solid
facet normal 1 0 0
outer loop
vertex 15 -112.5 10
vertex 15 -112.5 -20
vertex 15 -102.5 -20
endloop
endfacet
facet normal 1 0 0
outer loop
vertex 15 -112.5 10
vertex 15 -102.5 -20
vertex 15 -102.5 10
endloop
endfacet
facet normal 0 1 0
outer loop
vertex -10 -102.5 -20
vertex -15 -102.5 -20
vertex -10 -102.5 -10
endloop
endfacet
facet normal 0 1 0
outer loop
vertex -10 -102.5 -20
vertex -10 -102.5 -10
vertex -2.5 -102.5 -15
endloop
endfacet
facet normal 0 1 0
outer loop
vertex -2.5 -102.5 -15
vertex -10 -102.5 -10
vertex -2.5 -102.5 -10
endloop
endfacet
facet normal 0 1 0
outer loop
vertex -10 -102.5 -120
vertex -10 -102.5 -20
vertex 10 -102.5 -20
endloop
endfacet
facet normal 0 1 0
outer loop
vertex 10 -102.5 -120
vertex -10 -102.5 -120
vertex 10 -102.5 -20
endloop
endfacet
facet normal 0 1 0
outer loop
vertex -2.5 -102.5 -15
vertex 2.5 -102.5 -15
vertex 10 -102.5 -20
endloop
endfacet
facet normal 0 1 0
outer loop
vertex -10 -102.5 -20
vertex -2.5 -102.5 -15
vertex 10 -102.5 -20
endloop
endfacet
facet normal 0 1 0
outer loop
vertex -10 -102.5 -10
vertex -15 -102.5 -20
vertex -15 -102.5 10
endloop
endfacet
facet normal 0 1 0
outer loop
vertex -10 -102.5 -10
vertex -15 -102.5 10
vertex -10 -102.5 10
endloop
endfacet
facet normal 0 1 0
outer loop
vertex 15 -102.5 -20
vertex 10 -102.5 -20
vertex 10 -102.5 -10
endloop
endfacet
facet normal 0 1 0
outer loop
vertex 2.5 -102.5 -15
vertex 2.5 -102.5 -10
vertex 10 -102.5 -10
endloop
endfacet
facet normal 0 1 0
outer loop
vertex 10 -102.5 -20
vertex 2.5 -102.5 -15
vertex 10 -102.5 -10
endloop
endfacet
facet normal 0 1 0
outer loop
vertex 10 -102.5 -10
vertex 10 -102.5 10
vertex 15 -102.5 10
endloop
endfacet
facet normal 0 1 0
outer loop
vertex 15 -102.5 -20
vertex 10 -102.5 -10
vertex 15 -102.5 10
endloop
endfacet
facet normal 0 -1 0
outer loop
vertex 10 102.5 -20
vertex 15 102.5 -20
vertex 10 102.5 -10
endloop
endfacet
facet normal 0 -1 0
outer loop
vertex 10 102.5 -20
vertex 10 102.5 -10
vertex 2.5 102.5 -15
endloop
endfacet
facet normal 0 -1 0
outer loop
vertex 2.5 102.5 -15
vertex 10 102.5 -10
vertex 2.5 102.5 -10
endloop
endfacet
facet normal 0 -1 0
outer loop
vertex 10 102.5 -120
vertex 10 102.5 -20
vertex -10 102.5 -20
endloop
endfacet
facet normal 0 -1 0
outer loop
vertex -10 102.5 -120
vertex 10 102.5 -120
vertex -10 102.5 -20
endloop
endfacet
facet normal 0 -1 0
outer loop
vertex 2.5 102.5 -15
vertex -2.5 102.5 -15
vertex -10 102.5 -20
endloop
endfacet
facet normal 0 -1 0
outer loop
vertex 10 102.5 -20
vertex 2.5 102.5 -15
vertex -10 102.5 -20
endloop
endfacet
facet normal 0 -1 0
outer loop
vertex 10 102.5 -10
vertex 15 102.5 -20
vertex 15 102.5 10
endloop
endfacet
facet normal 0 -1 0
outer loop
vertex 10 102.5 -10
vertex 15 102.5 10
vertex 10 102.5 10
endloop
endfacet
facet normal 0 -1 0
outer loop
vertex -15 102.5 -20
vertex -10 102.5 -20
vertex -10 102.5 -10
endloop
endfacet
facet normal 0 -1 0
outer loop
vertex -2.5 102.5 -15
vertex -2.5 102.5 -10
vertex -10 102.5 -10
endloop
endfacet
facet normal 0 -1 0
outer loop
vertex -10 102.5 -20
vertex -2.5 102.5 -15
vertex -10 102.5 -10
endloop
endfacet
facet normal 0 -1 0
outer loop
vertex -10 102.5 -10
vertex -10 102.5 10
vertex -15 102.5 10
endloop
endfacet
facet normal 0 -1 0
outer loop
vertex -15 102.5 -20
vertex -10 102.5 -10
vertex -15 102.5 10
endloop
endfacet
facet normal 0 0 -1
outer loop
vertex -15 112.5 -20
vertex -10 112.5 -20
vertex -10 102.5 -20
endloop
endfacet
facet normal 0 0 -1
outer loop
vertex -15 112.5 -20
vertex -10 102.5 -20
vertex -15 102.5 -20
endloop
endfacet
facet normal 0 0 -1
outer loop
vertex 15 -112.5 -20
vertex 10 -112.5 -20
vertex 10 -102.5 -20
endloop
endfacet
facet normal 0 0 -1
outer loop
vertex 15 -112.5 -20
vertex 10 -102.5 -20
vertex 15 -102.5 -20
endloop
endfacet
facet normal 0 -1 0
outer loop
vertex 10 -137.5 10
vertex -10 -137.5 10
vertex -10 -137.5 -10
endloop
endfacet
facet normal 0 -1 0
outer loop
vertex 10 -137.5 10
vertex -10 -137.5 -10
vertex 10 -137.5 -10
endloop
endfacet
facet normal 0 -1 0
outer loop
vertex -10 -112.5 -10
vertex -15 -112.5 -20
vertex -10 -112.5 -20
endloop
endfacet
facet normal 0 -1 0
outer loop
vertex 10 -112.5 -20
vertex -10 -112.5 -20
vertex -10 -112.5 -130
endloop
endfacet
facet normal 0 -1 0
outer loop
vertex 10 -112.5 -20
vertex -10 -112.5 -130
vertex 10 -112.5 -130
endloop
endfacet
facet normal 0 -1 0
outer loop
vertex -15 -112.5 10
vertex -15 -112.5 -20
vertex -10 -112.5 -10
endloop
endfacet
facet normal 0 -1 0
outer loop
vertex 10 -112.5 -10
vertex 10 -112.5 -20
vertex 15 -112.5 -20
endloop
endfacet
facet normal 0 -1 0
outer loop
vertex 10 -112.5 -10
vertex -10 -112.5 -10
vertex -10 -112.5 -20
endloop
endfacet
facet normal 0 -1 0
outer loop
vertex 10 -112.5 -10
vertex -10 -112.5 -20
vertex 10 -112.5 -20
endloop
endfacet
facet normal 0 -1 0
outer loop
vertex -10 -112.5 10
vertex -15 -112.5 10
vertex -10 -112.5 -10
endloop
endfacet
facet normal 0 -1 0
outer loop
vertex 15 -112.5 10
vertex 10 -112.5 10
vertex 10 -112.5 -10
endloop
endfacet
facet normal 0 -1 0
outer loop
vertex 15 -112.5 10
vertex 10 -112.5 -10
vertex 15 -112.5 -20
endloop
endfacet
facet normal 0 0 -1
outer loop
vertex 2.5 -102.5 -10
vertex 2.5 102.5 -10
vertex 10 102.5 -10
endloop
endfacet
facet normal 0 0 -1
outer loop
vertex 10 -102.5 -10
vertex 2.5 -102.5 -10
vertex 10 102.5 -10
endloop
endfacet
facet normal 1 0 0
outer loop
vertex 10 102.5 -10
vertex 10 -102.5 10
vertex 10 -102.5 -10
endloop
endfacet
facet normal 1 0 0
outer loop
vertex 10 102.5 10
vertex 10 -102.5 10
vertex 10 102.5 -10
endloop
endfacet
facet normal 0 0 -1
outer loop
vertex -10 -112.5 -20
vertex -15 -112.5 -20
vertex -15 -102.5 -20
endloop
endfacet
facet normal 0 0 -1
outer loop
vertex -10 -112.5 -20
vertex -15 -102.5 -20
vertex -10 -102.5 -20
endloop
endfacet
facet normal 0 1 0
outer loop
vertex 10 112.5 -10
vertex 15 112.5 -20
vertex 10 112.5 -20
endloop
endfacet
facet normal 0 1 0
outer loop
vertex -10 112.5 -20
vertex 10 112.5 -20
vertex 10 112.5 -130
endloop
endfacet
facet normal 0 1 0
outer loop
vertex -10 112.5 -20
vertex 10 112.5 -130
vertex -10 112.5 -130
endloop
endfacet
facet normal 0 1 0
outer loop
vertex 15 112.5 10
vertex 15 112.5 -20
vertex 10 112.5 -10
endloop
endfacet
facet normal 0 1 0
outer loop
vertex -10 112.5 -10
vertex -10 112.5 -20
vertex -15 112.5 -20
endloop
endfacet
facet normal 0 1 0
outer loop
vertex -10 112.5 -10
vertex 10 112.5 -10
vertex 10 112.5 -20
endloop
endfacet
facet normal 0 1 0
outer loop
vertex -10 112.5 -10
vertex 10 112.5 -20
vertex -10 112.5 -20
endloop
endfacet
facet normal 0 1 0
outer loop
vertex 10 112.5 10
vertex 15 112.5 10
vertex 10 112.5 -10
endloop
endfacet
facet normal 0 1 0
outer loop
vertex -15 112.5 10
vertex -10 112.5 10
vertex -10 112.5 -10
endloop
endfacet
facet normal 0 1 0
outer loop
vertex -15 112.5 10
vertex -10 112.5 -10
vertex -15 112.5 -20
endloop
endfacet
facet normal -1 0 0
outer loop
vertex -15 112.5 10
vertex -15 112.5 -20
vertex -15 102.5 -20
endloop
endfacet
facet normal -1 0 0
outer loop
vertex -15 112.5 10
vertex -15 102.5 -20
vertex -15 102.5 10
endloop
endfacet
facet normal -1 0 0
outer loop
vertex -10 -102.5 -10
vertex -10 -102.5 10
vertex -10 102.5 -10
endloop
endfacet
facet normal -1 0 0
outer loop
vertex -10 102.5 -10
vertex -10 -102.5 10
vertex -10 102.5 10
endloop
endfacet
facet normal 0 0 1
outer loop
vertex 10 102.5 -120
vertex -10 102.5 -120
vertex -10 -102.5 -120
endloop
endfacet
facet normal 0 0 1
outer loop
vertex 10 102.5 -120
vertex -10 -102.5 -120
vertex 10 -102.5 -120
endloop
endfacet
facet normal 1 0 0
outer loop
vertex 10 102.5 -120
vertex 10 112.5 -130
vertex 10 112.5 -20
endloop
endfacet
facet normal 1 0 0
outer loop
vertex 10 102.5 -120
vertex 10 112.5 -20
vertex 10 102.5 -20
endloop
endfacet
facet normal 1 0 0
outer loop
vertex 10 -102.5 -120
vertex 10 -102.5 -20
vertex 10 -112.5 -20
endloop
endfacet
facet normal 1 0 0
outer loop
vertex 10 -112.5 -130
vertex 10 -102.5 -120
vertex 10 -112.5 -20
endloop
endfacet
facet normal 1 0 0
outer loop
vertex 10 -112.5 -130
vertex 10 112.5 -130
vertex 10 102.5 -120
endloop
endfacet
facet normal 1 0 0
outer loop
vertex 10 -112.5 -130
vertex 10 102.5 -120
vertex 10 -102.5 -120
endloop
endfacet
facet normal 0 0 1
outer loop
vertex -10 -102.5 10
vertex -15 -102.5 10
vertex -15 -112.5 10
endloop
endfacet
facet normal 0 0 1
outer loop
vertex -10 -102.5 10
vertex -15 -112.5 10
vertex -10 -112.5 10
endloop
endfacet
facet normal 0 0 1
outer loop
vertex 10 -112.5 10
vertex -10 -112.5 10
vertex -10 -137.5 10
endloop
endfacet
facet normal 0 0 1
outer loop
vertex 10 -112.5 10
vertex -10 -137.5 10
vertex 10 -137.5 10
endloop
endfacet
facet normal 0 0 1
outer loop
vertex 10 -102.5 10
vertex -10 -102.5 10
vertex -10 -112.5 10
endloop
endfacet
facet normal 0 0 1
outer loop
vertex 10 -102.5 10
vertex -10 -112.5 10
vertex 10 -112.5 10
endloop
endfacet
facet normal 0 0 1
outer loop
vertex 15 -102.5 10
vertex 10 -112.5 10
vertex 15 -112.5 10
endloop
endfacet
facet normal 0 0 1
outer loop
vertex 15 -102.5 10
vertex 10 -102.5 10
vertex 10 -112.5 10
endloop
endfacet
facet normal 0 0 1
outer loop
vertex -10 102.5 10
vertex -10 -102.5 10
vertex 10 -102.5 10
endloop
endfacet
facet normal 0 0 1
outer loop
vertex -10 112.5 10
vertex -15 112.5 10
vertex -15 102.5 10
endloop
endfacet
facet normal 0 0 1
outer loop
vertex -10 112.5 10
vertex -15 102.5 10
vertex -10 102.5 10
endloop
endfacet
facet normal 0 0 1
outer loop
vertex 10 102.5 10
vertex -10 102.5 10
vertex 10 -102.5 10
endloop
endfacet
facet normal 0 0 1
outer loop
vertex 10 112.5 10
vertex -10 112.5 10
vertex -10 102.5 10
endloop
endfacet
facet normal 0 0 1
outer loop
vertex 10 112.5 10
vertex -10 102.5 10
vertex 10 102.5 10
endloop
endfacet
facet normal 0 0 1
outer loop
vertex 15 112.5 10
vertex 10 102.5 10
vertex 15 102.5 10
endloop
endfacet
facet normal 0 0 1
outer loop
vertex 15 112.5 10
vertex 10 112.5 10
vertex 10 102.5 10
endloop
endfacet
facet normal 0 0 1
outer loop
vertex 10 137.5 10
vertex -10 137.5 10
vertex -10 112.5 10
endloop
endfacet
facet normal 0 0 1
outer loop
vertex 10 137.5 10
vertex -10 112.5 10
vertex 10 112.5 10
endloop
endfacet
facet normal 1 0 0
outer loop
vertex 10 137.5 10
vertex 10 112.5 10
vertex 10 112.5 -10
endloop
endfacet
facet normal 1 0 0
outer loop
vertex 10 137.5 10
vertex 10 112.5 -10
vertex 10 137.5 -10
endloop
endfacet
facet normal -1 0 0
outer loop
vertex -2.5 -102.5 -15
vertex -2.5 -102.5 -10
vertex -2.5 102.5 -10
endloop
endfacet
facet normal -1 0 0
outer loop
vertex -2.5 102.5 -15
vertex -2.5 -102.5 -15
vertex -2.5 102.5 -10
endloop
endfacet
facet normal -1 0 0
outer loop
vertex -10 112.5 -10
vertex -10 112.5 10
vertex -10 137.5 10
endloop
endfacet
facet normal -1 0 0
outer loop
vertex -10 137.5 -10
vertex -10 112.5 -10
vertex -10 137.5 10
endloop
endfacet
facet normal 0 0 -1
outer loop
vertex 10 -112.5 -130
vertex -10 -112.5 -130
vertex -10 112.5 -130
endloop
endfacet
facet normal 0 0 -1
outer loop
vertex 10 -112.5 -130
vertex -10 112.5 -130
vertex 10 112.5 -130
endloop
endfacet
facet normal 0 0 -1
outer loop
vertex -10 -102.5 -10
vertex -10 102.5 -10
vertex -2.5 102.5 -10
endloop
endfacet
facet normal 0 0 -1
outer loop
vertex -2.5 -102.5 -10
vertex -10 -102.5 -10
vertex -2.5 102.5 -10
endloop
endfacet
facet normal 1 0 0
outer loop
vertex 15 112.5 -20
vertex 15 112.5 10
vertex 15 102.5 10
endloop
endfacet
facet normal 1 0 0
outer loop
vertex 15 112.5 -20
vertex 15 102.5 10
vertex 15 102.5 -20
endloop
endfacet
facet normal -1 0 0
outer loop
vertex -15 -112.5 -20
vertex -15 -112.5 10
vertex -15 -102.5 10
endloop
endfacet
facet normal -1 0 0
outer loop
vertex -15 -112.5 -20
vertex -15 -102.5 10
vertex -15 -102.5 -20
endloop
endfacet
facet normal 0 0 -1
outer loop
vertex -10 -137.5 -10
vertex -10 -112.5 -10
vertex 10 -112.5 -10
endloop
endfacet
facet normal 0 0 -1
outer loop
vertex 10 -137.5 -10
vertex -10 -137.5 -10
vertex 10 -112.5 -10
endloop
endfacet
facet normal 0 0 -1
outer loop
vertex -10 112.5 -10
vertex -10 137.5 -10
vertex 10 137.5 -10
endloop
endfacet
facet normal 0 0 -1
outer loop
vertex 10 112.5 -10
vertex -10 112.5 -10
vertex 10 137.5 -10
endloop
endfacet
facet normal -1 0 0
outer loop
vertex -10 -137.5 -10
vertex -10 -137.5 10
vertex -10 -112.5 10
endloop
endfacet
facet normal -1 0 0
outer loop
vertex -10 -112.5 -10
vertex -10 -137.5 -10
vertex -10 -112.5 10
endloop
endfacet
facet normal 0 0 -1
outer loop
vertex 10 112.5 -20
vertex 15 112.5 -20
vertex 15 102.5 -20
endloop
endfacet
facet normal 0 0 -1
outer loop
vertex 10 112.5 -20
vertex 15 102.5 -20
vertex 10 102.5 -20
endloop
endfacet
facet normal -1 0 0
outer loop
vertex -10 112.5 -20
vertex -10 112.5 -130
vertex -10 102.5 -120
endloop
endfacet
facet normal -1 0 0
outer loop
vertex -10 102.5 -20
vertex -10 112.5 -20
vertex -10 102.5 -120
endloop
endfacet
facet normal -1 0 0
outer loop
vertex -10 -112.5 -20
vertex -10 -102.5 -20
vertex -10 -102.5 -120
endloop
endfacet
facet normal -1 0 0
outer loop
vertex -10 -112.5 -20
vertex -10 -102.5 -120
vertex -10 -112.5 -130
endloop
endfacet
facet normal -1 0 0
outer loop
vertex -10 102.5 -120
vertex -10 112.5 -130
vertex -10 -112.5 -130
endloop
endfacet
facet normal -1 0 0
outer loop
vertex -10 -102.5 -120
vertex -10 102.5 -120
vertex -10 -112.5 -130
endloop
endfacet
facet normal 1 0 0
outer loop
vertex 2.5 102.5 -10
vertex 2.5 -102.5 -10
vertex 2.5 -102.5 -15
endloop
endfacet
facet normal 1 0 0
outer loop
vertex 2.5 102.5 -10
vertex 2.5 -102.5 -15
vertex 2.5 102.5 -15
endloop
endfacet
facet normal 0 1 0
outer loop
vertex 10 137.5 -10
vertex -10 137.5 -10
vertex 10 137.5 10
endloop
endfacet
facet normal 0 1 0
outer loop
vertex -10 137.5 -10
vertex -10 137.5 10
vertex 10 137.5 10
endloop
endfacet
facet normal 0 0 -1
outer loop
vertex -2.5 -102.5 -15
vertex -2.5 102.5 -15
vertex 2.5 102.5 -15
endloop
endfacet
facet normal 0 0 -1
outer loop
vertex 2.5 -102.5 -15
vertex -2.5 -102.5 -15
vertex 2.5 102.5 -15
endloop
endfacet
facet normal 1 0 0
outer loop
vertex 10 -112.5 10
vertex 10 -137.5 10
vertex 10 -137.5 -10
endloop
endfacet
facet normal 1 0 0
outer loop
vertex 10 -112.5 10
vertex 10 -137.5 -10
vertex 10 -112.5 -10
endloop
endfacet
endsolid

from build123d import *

# Parameters (mm, degrees)
F0_W      = 20
F0_H      = 275
F1_DEPTH  = 10
F3_W      = 20
F3_H      = 110
F3_H_2    = 20
F4_DEPTH  = 10
F6_W      = 20
F6_H      = 20
F6_H_2    = 110
F7_DEPTH  = 10
F8_W      = 20
F8_H      = 205
F9_DEPTH  = 10
F10_W     = 5
F10_H     = 220
F11_DEPTH = 15


with BuildPart() as f1:
    # F0 (on Top) → F1 (new body, symmetric)
    with BuildSketch(Plane.XY):
        Rectangle(F0_W, F0_H)
    extrude(amount=F1_DEPTH, both=True)

    # F3 (on offset) → F4 (join)
    with BuildSketch(Plane.XZ.offset(112.5)):
        with Locations((0, -75)):
            Rectangle(F3_W, F3_H)
        with Locations((0, -10)):
            Rectangle(F3_W, F3_H_2)
        Polygon((15, -20), (15, 10), (-15, 10), (-15, -20), (-10, -20), (-10, 0), (10, 0), (10, -20), align=None)
    extrude(amount=-F4_DEPTH)

    # F6 (on offset) → F7 (join)
    with BuildSketch(Plane(origin=(0, 112.5, 0), x_dir=(-1, 0, 0), z_dir=(0, 1, 0))):
        with Locations((0, -10)):
            Rectangle(F6_W, F6_H)
        with Locations((0, -75)):
            Rectangle(F6_W, F6_H_2)
        Polygon((15, -20), (15, 10), (-15, 10), (-15, -20), (-10, -20), (-10, 0), (10, 0), (10, -20), align=None)
    extrude(amount=-F7_DEPTH)

    # F8 (on face) → F9 (join)
    with BuildSketch(Plane(origin=(0, 0, -130), x_dir=(1, 0, 0), z_dir=(0, 0, -1))):
        Rectangle(F8_W, F8_H)
    extrude(amount=-F9_DEPTH)

    # F10 (on Top) → F11 (join)
    with BuildSketch(Plane.XY):
        Rectangle(F10_W, F10_H)
    extrude(amount=-F11_DEPTH)


solid = f1.part
